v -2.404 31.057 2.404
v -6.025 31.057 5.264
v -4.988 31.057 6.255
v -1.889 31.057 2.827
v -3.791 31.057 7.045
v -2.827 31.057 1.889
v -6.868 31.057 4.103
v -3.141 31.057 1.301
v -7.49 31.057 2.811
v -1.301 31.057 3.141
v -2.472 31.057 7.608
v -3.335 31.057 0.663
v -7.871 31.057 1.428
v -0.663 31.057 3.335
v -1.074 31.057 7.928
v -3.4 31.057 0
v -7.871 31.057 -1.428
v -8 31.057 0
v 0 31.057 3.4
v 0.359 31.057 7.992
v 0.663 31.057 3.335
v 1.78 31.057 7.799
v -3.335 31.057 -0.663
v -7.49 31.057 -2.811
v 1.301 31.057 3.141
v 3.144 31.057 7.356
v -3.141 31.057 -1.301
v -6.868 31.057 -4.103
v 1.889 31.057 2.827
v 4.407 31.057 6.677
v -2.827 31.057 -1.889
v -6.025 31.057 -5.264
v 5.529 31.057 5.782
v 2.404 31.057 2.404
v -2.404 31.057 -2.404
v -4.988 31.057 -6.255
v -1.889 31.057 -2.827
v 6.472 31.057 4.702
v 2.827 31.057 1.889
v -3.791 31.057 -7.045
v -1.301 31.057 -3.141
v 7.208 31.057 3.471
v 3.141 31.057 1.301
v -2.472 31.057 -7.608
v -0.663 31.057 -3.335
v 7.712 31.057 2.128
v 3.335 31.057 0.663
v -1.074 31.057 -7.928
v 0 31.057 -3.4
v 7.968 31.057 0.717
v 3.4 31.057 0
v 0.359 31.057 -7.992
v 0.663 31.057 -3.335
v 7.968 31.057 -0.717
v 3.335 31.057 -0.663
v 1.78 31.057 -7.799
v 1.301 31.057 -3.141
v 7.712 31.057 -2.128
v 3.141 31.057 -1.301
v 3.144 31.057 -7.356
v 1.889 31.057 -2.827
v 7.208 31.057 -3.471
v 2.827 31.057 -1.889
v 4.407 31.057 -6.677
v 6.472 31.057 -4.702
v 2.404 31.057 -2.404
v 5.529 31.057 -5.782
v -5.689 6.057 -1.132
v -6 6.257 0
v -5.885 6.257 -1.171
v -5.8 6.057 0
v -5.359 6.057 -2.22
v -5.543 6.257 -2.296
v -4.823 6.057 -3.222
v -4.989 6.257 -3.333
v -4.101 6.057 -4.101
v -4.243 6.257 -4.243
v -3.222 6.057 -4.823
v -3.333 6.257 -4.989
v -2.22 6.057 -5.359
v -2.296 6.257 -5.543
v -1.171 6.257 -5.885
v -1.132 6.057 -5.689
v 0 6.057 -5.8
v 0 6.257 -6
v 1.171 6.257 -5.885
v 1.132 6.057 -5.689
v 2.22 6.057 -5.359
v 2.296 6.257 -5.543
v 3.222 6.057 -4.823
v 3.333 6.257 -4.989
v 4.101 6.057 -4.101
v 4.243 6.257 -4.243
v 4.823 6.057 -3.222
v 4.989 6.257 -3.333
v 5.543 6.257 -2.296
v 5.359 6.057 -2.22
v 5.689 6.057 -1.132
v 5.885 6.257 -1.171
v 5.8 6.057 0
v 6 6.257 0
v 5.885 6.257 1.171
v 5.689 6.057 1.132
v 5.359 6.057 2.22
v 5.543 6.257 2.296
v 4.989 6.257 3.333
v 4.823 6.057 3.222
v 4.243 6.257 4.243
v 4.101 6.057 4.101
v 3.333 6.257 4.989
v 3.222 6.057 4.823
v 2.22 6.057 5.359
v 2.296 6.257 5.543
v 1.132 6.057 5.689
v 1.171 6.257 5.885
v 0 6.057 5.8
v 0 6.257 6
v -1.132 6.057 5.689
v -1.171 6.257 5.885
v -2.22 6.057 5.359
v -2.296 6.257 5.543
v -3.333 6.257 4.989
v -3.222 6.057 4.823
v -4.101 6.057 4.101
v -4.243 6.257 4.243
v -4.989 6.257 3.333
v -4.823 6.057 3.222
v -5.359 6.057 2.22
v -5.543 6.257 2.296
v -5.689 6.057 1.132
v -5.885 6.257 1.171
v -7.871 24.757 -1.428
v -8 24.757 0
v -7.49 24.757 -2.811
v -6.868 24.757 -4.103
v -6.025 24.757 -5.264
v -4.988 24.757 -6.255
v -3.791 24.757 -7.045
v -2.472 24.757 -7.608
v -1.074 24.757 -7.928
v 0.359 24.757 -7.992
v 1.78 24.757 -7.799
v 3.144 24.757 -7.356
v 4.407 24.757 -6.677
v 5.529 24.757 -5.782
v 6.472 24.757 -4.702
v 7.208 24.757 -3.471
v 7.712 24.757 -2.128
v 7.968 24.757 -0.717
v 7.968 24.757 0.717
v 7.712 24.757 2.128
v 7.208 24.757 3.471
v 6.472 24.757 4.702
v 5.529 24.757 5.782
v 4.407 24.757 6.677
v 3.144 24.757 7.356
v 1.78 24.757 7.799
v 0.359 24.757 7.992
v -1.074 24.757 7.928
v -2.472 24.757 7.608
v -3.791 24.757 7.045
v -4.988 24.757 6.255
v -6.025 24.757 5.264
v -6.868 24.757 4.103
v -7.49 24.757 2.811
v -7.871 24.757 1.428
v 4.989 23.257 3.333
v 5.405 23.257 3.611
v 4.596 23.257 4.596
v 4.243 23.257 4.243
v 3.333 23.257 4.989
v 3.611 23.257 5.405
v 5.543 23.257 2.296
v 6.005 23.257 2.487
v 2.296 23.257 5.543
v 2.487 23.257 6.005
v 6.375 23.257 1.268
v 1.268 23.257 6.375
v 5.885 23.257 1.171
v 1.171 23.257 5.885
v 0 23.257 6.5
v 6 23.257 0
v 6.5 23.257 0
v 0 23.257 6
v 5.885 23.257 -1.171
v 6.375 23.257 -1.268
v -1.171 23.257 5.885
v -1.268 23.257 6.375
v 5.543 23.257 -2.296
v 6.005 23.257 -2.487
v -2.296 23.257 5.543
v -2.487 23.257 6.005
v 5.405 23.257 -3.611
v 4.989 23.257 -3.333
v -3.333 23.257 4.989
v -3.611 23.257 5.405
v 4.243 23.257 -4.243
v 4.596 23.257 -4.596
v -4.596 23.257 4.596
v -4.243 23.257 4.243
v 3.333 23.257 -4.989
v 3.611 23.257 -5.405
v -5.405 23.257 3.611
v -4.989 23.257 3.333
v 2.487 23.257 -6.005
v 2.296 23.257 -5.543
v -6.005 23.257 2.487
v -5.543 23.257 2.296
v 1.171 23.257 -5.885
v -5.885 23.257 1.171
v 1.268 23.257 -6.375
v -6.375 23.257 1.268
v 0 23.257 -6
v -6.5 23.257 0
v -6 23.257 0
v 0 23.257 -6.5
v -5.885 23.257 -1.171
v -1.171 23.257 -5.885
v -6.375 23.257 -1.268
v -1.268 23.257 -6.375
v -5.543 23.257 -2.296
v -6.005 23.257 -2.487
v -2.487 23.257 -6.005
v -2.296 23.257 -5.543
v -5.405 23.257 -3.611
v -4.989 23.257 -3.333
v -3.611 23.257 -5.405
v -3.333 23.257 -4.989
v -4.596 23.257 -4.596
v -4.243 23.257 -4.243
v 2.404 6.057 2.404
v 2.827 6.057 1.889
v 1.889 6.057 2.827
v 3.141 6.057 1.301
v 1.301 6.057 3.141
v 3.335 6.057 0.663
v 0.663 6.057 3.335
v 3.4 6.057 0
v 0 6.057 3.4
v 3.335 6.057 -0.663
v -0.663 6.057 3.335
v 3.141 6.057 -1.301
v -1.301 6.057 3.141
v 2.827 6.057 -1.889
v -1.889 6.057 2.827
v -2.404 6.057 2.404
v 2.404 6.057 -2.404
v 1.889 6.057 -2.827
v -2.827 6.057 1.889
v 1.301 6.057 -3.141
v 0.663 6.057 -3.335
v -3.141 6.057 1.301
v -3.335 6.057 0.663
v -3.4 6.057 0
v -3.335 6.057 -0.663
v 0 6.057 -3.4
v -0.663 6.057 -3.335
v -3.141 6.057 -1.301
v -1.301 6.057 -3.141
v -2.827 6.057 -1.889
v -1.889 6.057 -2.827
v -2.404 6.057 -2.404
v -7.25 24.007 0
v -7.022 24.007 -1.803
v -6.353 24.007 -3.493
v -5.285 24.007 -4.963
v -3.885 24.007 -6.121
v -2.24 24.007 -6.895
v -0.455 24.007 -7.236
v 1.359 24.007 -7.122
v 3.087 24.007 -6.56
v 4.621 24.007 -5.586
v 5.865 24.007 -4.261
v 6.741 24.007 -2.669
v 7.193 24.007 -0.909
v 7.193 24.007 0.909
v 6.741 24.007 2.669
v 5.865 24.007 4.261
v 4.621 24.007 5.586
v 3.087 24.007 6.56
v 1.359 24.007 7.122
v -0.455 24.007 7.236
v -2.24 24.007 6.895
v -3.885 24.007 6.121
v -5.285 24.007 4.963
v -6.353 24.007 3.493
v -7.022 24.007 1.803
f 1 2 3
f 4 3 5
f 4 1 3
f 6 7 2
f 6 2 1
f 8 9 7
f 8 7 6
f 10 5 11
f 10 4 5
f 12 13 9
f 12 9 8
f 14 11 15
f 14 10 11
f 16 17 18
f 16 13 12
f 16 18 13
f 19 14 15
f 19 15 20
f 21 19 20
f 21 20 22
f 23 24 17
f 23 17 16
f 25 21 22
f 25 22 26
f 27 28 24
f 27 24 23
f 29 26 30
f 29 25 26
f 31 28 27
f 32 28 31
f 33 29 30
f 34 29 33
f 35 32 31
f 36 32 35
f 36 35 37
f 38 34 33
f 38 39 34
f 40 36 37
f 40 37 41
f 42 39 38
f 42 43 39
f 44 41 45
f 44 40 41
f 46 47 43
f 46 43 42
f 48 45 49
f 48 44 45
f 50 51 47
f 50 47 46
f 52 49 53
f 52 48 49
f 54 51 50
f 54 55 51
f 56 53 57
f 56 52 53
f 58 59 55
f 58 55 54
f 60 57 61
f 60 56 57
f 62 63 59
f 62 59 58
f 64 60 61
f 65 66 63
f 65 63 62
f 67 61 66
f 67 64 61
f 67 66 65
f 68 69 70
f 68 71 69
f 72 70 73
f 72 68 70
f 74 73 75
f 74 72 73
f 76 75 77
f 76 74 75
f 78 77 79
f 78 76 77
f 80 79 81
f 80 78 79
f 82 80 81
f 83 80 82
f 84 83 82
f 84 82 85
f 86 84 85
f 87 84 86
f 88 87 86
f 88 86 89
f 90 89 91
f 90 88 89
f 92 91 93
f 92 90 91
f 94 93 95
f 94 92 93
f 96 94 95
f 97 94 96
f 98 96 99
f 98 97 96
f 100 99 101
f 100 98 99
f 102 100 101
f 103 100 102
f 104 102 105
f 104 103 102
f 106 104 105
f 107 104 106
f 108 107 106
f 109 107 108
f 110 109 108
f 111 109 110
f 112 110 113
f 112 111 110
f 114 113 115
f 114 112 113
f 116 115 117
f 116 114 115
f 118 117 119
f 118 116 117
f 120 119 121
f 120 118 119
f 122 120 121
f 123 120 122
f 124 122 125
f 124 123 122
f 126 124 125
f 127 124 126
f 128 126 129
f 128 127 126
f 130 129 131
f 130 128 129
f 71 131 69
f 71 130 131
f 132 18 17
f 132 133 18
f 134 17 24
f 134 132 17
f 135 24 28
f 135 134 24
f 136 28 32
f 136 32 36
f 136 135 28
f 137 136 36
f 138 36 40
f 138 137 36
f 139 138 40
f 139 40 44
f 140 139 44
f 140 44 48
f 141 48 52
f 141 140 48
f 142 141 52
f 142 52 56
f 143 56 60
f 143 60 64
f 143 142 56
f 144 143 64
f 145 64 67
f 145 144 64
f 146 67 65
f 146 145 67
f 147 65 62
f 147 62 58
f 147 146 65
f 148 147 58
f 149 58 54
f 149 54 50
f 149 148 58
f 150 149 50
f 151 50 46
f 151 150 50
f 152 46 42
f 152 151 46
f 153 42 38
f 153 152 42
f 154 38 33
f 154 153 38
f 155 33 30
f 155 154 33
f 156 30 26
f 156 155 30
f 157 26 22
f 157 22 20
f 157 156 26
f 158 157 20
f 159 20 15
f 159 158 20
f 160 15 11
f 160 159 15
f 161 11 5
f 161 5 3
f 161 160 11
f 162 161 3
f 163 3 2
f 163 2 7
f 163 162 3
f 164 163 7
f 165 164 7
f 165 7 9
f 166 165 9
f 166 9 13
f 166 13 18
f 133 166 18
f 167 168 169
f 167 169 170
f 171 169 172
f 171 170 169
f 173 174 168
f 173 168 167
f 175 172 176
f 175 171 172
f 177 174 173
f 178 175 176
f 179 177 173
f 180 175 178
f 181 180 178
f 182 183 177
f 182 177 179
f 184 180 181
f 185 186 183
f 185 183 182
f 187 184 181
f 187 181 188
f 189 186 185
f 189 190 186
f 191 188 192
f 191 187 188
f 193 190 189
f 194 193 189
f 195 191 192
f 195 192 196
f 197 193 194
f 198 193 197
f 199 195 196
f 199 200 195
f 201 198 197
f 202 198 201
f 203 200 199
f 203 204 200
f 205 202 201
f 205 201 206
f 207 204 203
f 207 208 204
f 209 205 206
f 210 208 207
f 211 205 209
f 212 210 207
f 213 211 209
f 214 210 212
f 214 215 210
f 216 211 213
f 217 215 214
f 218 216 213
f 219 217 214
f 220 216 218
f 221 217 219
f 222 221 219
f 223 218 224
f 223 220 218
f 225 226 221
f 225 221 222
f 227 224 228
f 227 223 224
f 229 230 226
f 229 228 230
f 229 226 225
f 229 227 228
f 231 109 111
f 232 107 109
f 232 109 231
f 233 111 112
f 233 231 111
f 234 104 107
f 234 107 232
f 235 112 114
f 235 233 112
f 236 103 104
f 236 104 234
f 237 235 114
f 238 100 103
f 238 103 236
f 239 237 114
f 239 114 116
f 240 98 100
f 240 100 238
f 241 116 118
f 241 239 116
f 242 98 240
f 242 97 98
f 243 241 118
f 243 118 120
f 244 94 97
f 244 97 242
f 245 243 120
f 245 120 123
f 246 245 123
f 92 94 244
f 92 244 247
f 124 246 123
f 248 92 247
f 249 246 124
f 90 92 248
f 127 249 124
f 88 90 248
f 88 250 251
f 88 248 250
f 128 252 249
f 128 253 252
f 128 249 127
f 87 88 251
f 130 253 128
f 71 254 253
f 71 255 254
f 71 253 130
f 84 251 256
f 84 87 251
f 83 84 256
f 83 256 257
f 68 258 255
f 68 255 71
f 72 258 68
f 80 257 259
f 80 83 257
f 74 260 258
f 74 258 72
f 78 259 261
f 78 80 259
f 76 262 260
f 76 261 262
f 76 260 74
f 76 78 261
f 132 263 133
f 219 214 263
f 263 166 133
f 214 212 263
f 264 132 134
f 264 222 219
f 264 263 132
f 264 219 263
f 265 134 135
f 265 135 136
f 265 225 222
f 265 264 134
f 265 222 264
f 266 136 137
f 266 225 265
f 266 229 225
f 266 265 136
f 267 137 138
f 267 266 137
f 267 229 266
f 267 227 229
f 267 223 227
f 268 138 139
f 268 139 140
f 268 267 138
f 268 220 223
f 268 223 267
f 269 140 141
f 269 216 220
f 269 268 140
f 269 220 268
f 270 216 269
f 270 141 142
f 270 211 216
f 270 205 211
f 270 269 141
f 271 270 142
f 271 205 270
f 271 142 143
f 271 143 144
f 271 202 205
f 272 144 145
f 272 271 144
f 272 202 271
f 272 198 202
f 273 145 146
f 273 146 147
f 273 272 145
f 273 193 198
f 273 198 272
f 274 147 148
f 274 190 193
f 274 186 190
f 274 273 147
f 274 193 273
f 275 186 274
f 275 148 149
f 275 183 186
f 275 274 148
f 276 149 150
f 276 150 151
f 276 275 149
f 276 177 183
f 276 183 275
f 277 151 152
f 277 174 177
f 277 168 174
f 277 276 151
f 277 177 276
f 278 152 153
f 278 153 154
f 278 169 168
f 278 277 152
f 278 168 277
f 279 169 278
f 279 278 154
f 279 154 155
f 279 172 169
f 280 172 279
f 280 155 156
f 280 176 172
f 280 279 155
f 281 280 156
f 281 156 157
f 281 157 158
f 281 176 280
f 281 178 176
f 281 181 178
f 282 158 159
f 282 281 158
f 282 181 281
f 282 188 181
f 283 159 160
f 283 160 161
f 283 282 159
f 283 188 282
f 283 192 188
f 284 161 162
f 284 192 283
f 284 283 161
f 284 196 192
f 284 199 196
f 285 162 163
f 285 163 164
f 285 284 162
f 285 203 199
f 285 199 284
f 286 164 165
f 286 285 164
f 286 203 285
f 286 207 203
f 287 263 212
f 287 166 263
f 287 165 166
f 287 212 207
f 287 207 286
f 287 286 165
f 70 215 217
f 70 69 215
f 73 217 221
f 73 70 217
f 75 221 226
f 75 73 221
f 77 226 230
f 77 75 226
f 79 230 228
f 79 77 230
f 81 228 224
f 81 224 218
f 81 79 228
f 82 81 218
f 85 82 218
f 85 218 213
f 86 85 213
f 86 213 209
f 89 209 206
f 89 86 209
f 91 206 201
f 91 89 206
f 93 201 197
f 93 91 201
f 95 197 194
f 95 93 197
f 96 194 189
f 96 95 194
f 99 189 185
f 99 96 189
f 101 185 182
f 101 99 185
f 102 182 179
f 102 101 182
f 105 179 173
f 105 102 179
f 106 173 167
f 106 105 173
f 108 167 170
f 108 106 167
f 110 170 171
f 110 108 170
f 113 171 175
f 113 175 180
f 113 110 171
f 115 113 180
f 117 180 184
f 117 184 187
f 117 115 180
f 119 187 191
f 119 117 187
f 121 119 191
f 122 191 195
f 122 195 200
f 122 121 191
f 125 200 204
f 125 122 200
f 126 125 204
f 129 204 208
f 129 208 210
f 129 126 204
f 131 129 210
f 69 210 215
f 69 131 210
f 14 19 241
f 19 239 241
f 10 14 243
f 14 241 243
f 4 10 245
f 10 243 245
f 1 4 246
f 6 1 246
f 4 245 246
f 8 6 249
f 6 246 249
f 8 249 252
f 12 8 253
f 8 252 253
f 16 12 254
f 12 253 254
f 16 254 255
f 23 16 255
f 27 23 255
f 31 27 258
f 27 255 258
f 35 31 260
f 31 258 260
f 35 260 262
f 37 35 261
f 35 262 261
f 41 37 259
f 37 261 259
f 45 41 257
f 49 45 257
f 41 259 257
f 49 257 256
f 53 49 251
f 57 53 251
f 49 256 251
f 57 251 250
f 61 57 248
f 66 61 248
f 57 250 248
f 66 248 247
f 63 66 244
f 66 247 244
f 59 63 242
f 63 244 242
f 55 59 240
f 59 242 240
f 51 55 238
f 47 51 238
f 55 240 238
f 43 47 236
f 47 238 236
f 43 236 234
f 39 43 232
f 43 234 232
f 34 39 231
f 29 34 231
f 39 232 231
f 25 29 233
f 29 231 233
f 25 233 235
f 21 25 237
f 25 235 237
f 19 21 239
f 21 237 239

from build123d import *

# Parameters (mm, degrees)
SKETCH3_W = 3.4
SKETCH3_H = 25


with BuildPart() as part:
    # Sketch1 → Revolve1 (revolve)
    with BuildSketch(Plane.XY):
        Polygon((-6, 23.256587884), (-6, 6.256587884), (-5.8, 6.056587884), (0, 6.056587884), (0, 31.056587884), (-8, 31.056587884), (-8, 24.756587884), (-6.5, 23.256587884), align=None)
    revolve(axis=Axis((0, 31.056587884, 0), (0, -1, 0)))

    # Sketch3 → M8x1.25 Tapped Hole1 (revolve, cut)
    with BuildSketch(Plane(origin=(0, 31.056587884, 0), x_dir=(0, 0, 1), z_dir=(1, 0, 0))):
        with Locations((1.7, 12.5)):
            Rectangle(SKETCH3_W, SKETCH3_H)
    revolve(axis=Axis((0, 37.406587884, 0), (0, -1, 0)), mode=Mode.SUBTRACT)


solid = part.part
